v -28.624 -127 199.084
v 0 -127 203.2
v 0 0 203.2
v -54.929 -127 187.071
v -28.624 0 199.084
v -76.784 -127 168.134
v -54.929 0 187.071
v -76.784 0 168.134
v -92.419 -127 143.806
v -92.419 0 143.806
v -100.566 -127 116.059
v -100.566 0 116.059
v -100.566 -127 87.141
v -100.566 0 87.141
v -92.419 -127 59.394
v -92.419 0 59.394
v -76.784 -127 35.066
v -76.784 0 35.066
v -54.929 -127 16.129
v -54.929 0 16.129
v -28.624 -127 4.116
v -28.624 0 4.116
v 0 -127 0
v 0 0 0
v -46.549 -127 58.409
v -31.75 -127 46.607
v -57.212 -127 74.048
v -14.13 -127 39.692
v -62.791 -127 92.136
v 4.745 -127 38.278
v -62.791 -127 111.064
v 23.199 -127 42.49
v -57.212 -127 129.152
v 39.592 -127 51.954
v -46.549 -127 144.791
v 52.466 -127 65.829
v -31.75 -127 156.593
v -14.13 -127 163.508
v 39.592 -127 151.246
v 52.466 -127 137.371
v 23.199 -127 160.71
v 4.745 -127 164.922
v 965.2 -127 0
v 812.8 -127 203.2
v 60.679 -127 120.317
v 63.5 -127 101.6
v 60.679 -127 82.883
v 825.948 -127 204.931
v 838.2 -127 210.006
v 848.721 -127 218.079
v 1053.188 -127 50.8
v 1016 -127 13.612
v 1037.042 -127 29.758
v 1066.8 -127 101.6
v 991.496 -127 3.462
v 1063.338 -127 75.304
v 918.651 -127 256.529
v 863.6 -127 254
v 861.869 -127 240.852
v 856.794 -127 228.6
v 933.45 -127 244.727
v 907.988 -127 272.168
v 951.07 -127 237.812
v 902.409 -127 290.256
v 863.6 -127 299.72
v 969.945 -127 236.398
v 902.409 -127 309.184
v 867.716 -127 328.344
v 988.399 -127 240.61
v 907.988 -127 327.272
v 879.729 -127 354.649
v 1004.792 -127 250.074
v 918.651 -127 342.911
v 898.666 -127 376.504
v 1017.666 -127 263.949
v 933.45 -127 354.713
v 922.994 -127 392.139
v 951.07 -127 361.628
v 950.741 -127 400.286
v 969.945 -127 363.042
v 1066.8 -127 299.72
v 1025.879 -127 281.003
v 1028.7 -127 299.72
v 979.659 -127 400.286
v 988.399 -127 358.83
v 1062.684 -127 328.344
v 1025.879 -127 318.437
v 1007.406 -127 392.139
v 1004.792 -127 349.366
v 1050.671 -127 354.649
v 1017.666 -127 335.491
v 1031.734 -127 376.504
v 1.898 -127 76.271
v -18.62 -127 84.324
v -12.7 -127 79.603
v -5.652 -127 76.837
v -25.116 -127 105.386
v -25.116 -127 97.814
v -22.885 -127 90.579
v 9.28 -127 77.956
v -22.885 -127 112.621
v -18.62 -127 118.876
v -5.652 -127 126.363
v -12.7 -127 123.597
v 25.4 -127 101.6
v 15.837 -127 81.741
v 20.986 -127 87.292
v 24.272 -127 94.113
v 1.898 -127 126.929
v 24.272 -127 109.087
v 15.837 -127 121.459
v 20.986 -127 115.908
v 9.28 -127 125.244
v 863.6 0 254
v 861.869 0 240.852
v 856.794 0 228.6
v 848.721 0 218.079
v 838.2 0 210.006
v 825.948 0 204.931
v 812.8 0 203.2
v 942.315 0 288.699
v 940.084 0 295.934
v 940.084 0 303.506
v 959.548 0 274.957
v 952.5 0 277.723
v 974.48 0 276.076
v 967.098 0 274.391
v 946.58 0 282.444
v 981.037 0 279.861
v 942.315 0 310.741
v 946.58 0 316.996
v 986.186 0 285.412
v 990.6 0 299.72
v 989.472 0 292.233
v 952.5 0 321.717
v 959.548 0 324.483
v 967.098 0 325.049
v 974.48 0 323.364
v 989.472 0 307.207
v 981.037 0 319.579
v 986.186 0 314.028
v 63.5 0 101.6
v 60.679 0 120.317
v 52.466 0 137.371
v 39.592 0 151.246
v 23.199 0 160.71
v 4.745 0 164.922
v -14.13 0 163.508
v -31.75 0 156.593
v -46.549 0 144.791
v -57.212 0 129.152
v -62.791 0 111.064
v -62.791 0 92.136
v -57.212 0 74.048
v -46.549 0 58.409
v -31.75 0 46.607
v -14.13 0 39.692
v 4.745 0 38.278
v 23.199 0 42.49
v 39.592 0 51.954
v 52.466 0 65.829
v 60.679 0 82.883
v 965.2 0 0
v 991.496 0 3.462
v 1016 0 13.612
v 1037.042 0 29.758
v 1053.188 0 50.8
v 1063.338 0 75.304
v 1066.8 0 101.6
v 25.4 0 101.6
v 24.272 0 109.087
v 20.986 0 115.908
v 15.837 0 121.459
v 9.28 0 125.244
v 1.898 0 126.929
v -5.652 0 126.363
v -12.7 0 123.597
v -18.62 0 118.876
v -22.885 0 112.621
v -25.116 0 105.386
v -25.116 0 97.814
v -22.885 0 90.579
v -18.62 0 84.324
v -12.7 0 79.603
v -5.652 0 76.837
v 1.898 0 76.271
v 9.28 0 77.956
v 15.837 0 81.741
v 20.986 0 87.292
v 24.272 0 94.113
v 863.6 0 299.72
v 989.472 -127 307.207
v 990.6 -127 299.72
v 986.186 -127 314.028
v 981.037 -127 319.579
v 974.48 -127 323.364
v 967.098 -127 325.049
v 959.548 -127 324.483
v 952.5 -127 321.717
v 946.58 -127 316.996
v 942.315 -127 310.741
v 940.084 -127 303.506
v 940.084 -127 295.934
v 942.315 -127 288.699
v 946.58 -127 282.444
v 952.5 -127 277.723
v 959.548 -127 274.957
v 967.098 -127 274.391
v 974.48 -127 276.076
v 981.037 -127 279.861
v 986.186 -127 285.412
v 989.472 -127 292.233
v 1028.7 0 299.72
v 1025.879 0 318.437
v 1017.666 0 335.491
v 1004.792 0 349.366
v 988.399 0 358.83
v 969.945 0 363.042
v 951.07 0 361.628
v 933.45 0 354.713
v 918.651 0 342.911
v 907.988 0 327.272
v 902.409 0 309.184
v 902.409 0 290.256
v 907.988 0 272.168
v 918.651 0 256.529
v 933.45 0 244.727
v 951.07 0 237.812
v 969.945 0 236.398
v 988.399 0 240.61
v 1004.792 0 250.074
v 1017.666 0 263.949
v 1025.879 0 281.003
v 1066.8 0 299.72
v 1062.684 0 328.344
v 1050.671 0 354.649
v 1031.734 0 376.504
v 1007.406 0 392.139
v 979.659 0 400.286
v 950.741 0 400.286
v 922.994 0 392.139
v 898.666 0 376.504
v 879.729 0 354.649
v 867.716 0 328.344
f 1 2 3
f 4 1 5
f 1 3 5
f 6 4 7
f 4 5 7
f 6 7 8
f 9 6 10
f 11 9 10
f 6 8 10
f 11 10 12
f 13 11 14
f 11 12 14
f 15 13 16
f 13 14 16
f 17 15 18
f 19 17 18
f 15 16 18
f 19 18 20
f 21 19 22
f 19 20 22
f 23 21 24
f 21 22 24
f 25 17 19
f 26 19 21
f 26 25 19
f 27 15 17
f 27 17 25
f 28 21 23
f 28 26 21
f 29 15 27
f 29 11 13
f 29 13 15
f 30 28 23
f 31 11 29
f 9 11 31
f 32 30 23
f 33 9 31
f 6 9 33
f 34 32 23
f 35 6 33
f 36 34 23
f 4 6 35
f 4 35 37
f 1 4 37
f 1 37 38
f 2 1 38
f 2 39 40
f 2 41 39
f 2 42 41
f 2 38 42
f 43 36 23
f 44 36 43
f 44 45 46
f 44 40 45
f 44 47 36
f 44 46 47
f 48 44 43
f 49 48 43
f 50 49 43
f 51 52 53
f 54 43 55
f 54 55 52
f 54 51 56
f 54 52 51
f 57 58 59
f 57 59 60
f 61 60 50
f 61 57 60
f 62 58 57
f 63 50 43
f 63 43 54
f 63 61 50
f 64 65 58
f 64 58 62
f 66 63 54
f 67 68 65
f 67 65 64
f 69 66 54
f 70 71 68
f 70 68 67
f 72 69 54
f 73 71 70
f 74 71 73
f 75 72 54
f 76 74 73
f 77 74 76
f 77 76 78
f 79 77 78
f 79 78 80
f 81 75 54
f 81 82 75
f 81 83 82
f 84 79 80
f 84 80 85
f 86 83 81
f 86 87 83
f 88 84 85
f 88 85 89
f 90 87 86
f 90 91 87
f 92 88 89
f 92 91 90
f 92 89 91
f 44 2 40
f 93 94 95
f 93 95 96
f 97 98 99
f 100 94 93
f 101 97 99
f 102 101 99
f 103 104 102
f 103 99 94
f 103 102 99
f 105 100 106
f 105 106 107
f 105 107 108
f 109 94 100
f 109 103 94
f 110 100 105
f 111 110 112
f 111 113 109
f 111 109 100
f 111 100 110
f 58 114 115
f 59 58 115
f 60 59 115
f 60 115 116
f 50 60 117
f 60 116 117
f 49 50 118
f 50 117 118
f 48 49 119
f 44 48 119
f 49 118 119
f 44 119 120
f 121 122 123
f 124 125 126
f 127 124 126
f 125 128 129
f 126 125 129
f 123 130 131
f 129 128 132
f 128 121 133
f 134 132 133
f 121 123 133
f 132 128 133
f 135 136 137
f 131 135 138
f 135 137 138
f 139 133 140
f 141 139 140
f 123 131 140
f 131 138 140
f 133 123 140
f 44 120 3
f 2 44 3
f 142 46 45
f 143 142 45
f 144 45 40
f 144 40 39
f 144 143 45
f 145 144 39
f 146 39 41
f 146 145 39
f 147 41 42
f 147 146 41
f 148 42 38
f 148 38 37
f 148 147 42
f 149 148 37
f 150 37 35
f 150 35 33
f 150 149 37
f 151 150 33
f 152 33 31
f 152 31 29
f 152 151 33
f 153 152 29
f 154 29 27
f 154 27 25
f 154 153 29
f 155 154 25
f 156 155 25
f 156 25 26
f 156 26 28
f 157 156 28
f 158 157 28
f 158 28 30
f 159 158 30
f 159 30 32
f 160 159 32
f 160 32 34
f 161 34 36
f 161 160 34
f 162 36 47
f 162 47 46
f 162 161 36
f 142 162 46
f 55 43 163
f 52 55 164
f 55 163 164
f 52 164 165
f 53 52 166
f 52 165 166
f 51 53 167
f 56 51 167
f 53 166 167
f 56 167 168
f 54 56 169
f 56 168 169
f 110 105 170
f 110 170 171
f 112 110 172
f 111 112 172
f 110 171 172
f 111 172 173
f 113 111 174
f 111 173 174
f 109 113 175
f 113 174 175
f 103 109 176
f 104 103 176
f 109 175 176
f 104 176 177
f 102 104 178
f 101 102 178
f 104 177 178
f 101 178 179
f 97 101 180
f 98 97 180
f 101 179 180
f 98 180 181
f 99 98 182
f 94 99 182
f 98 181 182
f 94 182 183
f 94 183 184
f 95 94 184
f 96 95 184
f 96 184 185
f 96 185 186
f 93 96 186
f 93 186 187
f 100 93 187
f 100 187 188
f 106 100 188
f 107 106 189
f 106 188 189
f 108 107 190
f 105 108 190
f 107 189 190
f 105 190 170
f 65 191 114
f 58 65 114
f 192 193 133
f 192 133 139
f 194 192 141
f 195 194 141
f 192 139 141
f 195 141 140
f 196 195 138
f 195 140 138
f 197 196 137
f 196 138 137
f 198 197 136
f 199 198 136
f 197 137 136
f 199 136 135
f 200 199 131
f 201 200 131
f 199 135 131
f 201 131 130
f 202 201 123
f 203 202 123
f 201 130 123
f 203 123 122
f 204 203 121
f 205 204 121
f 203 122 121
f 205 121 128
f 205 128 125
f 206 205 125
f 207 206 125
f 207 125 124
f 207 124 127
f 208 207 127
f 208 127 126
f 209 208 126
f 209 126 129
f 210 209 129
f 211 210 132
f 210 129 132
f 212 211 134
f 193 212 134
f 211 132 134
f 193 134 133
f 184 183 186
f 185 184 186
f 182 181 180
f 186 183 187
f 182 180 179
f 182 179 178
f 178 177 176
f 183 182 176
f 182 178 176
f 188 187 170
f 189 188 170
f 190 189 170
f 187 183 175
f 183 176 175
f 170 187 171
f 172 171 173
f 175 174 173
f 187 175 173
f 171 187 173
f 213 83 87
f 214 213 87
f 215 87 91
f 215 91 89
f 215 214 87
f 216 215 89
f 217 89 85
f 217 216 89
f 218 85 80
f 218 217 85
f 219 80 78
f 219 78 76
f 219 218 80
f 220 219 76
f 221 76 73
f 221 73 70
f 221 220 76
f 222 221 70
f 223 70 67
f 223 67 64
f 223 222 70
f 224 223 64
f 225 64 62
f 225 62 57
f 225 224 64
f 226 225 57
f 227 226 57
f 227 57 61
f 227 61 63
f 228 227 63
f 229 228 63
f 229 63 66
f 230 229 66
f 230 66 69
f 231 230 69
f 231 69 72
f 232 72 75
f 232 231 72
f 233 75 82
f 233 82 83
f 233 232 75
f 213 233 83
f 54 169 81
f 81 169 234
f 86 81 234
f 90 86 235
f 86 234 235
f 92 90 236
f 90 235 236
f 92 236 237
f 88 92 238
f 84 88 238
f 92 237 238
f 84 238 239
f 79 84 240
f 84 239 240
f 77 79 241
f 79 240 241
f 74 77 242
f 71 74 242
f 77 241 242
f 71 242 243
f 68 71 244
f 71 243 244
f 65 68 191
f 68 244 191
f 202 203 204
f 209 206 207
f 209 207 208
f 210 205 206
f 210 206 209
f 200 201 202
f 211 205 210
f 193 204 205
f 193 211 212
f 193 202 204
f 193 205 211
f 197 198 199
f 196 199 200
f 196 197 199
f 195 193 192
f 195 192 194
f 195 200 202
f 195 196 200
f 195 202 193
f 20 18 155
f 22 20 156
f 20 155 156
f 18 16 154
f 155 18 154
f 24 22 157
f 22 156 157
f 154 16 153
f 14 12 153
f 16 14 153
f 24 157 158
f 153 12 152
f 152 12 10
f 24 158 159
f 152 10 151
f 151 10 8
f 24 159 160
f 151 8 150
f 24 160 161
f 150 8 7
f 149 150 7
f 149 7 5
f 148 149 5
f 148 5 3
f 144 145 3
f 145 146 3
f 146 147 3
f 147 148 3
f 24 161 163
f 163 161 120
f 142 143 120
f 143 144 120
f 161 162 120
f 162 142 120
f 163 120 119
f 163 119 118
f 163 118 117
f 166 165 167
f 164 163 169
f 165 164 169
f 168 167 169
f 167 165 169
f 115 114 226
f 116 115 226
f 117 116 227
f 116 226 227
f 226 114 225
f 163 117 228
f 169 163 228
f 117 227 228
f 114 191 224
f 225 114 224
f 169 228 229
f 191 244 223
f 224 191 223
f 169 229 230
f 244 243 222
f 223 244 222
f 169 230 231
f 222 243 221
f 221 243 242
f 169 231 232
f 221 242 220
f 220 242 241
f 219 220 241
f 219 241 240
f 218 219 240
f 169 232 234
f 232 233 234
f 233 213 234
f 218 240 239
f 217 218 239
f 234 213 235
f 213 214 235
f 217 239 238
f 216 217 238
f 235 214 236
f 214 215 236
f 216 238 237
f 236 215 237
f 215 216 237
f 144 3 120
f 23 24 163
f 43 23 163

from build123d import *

# Parameters (mm, degrees)
F0_R     = 63.5
F0_R_2   = 25.4
F1_DEPTH = 127


with BuildPart() as f1:
    # F0 (on Front) → F1 (new body)
    with BuildSketch(Plane.XZ):
        with BuildLine():
            ThreePointArc((0, 203.2), (-101.6, 101.6), (0, 0))
            Line((0, 0), (863.6, 0))
            Line((863.6, 0), (965.2, 0))
            ThreePointArc((965.2, 0), (1037.042049, 29.757951), (1066.8, 101.6))
            Line((1066.8, 101.6), (1066.8, 299.72))
            ThreePointArc((1066.8, 299.72), (965.2, 401.32), (863.6, 299.72))
            Line((863.6, 299.72), (863.6, 254))
            ThreePointArc((863.6, 254), (848.721024, 218.078976), (812.8, 203.2))
            Line((812.8, 203.2), (0, 203.2))
        make_face()
        with Locations((0, 101.6)):
            Circle(F0_R, mode=Mode.SUBTRACT)
        with Locations((965.2, 299.72)):
            Circle(F0_R, mode=Mode.SUBTRACT)
        with Locations((0, 101.6)):
            Circle(F0_R_2)
        with Locations((965.2, 299.72)):
            Circle(F0_R_2)
    extrude(amount=F1_DEPTH)


solid = f1.part
